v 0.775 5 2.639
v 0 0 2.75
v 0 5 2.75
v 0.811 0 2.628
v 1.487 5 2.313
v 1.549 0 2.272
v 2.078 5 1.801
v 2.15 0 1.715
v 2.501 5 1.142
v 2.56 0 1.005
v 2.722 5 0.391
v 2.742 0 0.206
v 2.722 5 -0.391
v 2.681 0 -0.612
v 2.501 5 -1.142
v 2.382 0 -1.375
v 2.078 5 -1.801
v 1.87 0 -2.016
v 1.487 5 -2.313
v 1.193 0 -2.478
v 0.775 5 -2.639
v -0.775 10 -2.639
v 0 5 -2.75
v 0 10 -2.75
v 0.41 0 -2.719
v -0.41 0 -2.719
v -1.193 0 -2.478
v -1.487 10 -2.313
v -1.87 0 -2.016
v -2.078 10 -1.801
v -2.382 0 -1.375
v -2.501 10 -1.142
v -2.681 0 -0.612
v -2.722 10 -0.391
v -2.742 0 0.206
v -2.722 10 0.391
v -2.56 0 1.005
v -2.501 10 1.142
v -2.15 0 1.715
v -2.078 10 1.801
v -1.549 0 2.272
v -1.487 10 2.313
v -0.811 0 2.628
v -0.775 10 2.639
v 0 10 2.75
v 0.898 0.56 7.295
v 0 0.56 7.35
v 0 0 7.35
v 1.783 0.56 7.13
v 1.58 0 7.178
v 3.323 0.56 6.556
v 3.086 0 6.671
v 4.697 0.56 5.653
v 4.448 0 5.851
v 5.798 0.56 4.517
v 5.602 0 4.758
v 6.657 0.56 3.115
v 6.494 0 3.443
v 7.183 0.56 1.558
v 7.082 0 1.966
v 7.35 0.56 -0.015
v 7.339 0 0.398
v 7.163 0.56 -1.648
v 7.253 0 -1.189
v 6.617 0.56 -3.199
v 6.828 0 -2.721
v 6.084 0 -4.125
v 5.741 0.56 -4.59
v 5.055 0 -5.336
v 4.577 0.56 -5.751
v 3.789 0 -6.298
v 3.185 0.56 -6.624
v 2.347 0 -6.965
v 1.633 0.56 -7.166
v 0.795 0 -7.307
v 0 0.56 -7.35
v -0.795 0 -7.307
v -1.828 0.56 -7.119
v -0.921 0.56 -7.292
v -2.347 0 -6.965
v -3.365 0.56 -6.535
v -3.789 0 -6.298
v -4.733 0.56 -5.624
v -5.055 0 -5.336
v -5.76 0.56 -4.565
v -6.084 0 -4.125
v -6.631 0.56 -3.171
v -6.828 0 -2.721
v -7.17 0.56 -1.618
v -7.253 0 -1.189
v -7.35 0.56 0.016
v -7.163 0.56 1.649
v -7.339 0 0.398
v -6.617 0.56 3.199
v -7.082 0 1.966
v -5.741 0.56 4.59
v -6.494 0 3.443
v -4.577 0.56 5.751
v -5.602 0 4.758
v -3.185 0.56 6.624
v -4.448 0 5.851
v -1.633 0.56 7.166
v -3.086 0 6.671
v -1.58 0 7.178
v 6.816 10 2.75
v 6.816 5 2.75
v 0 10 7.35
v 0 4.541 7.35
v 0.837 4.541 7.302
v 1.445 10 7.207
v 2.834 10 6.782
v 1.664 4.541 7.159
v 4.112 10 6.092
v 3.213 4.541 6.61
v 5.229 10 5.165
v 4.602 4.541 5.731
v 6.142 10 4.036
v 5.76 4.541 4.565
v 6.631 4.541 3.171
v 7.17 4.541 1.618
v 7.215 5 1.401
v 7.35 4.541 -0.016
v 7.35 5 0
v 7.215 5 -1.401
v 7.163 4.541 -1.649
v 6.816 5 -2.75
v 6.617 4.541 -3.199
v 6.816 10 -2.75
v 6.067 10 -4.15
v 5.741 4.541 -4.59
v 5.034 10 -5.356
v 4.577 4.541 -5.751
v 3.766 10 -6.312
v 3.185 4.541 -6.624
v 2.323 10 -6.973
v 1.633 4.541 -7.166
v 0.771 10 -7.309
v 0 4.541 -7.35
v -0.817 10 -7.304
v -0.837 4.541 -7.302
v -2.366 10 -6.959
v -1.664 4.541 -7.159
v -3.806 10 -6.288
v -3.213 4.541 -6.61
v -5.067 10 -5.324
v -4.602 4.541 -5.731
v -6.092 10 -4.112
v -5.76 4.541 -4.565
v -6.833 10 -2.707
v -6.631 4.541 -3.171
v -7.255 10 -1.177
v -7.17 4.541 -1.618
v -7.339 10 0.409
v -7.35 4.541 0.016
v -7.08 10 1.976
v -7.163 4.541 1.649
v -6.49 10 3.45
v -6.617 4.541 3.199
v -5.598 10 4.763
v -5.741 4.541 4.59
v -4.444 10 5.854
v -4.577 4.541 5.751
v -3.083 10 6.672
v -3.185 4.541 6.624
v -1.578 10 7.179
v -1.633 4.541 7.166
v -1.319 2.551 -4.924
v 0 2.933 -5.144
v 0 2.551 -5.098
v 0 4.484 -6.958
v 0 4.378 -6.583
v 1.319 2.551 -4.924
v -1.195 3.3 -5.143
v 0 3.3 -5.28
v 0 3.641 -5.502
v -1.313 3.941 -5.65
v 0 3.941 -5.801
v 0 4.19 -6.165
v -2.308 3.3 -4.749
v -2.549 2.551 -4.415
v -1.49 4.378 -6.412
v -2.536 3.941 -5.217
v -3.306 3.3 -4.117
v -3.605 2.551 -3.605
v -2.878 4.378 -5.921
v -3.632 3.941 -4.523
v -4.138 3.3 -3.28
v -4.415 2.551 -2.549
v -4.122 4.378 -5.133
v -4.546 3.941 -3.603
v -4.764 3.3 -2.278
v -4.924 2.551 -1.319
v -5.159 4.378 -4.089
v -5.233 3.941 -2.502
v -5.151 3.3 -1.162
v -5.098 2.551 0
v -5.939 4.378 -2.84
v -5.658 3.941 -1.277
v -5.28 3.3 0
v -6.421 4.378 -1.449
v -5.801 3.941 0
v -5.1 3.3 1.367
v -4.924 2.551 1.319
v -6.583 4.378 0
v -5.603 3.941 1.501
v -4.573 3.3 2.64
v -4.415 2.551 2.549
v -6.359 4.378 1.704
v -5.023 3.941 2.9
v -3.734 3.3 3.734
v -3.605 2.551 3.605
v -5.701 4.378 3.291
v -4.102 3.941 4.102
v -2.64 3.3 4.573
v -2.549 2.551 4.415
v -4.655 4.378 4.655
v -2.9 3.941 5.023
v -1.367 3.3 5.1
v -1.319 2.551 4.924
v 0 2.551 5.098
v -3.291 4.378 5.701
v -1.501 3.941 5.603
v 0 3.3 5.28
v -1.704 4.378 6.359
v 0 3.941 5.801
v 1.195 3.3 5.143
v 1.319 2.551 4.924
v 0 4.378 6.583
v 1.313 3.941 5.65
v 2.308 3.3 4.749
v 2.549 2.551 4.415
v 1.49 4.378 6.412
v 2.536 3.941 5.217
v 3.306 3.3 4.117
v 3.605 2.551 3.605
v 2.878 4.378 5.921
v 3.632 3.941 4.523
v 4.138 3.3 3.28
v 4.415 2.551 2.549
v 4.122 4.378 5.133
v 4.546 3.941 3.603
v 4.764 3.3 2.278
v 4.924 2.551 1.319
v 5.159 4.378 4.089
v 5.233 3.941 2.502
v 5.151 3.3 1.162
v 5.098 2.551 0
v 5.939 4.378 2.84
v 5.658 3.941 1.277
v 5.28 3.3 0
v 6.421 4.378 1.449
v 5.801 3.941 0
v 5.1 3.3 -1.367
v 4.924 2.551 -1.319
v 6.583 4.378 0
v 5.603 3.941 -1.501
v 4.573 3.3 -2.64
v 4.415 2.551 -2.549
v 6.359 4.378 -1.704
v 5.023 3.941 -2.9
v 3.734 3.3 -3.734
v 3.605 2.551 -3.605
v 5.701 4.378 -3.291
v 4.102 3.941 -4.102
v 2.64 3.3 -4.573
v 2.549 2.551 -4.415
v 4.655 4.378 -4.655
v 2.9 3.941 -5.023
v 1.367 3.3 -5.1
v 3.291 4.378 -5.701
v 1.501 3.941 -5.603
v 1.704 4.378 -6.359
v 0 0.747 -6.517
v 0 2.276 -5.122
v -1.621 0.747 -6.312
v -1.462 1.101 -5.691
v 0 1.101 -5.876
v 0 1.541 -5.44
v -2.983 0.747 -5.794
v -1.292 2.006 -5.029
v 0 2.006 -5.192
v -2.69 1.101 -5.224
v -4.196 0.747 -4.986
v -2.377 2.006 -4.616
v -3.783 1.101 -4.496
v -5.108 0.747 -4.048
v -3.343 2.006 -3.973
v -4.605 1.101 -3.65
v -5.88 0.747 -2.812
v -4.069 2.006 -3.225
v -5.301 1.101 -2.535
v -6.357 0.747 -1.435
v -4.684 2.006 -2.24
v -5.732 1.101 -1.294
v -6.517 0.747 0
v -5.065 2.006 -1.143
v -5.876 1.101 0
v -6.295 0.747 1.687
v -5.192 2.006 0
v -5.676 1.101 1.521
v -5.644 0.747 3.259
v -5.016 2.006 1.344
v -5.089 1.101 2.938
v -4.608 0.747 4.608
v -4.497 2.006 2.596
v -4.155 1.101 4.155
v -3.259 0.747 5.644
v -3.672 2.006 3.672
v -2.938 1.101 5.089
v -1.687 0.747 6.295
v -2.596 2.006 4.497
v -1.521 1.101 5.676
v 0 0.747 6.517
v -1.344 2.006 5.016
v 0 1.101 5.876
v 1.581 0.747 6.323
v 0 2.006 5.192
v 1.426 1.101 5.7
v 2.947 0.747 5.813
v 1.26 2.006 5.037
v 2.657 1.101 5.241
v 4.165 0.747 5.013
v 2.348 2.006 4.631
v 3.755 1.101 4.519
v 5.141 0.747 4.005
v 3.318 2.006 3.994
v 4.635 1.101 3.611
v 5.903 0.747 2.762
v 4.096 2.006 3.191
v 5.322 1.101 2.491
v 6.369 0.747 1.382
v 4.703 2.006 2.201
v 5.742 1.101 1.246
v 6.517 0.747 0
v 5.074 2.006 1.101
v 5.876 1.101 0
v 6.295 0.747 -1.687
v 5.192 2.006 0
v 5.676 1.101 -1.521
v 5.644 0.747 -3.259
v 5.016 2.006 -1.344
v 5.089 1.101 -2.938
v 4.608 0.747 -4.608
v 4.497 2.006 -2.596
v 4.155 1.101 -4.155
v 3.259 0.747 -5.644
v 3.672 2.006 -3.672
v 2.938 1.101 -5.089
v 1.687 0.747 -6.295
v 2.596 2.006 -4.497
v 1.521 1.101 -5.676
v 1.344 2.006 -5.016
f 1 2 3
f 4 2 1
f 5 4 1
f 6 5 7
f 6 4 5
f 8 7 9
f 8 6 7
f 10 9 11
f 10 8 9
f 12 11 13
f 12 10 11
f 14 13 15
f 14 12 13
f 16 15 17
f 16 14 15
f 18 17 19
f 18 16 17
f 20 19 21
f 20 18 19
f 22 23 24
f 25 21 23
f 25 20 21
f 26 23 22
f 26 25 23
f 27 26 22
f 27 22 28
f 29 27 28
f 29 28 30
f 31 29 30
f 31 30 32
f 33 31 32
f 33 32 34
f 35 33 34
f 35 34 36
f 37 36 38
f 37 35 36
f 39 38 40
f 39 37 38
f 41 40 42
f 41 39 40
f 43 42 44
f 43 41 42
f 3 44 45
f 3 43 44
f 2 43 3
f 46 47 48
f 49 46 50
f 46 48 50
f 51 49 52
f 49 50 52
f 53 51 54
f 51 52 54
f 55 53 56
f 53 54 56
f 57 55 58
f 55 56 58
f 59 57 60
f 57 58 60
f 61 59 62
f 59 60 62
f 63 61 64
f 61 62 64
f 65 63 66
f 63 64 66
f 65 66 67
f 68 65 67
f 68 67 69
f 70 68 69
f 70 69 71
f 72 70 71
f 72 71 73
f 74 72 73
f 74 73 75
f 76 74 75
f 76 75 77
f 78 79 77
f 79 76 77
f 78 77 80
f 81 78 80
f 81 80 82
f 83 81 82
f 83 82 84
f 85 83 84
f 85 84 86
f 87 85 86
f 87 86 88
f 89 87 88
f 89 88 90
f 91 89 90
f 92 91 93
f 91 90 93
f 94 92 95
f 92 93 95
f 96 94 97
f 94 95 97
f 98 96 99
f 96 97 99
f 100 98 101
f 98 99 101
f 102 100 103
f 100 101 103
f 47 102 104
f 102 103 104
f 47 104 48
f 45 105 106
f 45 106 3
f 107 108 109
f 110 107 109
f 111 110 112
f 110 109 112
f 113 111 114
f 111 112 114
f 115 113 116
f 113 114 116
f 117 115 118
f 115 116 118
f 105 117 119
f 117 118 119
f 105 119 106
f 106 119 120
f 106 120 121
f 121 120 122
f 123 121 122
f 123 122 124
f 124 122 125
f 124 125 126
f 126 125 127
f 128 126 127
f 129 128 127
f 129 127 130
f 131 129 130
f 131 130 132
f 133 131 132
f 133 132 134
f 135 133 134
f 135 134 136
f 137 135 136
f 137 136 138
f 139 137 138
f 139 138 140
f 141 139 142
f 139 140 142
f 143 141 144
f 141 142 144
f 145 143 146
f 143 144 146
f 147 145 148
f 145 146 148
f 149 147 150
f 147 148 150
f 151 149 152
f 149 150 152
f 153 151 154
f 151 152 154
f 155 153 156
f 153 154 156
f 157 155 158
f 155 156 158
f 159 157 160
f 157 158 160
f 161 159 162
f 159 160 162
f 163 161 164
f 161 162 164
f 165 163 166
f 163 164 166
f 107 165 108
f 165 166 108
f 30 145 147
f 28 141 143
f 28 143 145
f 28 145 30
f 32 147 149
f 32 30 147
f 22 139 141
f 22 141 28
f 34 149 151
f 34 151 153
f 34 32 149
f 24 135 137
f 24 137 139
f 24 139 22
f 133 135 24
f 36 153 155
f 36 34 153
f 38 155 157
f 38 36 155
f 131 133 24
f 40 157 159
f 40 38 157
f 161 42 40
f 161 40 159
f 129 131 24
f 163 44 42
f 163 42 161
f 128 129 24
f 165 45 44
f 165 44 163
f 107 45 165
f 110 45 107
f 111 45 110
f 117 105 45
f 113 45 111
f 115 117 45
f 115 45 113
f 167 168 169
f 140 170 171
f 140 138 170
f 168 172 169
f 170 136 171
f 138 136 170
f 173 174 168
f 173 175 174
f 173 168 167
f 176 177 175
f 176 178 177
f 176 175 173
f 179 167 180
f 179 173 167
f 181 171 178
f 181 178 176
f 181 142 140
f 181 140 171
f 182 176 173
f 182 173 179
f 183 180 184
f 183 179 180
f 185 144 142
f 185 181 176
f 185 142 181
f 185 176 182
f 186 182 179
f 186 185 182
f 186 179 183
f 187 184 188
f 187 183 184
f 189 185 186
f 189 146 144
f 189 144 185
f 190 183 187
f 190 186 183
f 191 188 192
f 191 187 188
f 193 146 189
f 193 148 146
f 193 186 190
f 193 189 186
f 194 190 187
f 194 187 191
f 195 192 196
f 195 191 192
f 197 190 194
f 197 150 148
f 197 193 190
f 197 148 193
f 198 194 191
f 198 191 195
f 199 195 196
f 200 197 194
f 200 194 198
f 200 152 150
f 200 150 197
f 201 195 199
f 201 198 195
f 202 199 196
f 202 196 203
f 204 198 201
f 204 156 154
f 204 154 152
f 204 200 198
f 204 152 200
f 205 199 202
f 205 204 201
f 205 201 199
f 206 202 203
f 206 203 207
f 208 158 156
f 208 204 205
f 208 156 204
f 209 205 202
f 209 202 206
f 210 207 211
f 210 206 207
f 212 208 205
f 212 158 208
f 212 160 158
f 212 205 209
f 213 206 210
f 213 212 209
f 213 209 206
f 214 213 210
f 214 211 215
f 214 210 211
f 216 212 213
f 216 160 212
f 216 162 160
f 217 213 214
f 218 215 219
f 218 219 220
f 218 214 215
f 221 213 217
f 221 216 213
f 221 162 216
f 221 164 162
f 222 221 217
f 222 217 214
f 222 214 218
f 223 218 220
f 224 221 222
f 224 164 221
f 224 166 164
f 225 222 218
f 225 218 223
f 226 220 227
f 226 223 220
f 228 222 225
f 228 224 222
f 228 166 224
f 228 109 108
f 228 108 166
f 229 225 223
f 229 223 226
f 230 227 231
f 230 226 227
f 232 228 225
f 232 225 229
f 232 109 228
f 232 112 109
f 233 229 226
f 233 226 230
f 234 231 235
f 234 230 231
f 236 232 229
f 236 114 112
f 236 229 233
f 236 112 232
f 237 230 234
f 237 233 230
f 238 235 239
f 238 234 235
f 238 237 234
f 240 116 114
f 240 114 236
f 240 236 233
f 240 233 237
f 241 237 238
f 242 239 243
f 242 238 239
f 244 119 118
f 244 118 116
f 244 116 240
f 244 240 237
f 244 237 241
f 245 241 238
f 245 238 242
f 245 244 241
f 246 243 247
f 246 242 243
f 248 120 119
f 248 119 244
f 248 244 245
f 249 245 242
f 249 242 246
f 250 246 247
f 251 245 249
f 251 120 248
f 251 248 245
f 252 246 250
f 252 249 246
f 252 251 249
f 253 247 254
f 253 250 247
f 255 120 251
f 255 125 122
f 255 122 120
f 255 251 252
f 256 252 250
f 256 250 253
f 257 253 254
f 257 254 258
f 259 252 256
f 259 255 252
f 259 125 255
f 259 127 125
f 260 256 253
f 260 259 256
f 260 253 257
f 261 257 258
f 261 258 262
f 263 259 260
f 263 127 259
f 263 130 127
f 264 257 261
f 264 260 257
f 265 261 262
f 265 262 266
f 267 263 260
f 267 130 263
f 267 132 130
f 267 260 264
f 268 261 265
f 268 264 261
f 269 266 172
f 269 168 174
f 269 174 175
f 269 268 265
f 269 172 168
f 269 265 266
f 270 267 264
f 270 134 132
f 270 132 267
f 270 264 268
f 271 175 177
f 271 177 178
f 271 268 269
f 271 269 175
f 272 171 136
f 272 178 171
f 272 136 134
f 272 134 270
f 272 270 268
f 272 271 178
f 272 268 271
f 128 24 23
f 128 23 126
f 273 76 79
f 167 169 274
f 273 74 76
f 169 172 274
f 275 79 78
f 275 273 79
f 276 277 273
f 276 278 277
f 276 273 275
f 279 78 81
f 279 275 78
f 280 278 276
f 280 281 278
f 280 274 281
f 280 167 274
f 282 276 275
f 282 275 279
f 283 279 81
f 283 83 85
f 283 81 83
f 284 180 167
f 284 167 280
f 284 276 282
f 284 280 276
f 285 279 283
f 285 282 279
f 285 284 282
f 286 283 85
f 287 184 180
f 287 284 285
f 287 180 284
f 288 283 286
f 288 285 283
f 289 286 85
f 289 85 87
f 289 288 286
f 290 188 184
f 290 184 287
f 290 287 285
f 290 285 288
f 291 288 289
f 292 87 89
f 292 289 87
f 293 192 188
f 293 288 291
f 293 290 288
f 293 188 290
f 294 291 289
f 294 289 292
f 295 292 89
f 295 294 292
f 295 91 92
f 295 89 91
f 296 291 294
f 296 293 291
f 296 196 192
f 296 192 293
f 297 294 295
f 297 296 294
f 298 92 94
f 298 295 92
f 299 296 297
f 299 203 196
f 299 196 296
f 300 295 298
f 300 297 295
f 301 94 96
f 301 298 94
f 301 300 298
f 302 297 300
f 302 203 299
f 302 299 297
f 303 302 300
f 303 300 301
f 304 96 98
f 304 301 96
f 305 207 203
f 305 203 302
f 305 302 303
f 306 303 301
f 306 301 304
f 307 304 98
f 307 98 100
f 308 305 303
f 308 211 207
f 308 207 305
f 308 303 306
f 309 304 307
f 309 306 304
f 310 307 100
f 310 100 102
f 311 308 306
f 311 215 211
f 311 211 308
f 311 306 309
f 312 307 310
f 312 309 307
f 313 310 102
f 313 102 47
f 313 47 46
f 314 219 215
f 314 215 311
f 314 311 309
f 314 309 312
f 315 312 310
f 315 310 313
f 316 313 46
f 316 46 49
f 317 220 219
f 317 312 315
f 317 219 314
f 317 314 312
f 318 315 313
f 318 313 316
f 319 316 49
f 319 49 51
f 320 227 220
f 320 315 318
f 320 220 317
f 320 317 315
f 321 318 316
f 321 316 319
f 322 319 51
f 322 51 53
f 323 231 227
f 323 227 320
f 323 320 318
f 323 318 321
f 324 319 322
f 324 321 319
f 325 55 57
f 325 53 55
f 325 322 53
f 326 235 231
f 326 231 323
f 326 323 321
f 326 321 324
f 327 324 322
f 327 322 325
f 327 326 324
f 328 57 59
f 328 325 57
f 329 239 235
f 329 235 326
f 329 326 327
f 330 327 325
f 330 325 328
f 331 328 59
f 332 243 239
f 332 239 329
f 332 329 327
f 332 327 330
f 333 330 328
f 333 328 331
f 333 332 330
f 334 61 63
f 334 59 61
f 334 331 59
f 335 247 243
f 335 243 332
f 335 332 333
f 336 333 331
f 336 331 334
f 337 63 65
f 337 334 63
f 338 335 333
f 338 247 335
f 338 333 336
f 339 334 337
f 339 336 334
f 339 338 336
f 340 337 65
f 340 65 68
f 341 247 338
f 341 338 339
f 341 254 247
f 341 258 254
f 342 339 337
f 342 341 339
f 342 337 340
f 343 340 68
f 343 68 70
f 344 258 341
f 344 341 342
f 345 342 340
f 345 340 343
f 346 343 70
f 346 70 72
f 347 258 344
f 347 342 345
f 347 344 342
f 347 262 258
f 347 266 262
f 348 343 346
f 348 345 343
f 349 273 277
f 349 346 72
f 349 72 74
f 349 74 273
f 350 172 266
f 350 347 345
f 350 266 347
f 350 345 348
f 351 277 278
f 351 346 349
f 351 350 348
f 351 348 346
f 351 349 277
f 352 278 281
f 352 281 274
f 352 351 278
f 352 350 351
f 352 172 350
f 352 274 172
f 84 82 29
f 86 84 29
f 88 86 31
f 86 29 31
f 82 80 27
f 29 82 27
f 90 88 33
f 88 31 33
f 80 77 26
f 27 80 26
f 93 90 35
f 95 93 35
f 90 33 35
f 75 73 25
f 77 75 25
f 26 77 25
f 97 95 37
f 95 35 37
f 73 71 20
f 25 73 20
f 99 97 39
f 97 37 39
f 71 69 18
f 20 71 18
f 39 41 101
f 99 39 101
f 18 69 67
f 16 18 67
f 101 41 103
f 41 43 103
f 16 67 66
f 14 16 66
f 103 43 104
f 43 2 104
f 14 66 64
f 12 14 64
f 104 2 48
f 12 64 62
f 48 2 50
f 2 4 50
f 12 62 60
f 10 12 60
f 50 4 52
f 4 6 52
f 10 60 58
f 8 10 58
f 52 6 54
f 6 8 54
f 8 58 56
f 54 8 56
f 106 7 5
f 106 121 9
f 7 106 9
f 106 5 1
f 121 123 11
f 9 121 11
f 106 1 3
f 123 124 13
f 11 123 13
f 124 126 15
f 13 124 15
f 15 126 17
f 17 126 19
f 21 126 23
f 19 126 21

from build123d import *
from build123d.topology import SkipClean

# Parameters (mm, degrees)
SKETCH1_R               = 7.35
BOSS_EXTRUDE1_DEPTH     = 10
CUT_EXTRUDE1_DEPTH      = 5
CUT_EXTRUDE2_DEPTH      = 15.423765112
CUT_EXTRUDE2_DEPTH_BACK = 15.423765112
SKETCH3_R               = 2.75
SKETCH4_RX              = 2.5
SKETCH4_RY              = 2


with BuildPart() as part:
    # Sketch1 → Boss-Extrude1 (new body)
    with BuildSketch(Plane(origin=(0, 0, 0), x_dir=(1, 0, 0), z_dir=(0, 1, 0))):
        with Locations(Location((0, 0, 0), (0, 0, 270))):
            Circle(SKETCH1_R)
    extrude(amount=BOSS_EXTRUDE1_DEPTH)

    # Sketch2 → Cut-Extrude1 (cut)
    with BuildSketch(Plane(origin=(0, 10, 0), x_dir=(1, 0, 0), z_dir=(0, 1, 0))):
        with BuildLine():
            Line((0, 2.75), (9.425049625, 2.75))
            Line((9.425049625, 2.75), (9.711324497, -2.75))
            Line((9.711324497, -2.75), (0, -2.75))
            ThreePointArc((0, -2.75), (-2.75, 0), (0, 2.75))
        make_face()
    extrude(amount=-CUT_EXTRUDE1_DEPTH, mode=Mode.SUBTRACT)

    # Sketch3 → Cut-Extrude2 (cut, two sides: drawn at the far end of the back side and taken through both)
    with BuildSketch(Plane(origin=(0, 10, 0), x_dir=(1, 0, 0), z_dir=(0, 1, 0)).offset(-CUT_EXTRUDE2_DEPTH_BACK)):
        with Locations(Location((0, 0, 0), (0, 0, 270))):
            Circle(SKETCH3_R)
    extrude(amount=CUT_EXTRUDE2_DEPTH + CUT_EXTRUDE2_DEPTH_BACK, mode=Mode.SUBTRACT)

    # Sketch4 → Cut-Revolve1 (revolve, cut)
    with SkipClean():  # the faces are left unmerged after this step: merging them gives an invalid solid
        with BuildSketch(Plane.XY, mode=Mode.PRIVATE) as cut_revolve1_sk:
            with Locations((-7.59796792, 2.550632184)):
                Ellipse(SKETCH4_RX, SKETCH4_RY)
        revolve(cut_revolve1_sk.sketch.rotate(Axis((0, 10, 0), (0, 1, 0)), 270), axis=Axis((0, 10, 0), (0, 1, 0)), mode=Mode.SUBTRACT)


solid = part.part
